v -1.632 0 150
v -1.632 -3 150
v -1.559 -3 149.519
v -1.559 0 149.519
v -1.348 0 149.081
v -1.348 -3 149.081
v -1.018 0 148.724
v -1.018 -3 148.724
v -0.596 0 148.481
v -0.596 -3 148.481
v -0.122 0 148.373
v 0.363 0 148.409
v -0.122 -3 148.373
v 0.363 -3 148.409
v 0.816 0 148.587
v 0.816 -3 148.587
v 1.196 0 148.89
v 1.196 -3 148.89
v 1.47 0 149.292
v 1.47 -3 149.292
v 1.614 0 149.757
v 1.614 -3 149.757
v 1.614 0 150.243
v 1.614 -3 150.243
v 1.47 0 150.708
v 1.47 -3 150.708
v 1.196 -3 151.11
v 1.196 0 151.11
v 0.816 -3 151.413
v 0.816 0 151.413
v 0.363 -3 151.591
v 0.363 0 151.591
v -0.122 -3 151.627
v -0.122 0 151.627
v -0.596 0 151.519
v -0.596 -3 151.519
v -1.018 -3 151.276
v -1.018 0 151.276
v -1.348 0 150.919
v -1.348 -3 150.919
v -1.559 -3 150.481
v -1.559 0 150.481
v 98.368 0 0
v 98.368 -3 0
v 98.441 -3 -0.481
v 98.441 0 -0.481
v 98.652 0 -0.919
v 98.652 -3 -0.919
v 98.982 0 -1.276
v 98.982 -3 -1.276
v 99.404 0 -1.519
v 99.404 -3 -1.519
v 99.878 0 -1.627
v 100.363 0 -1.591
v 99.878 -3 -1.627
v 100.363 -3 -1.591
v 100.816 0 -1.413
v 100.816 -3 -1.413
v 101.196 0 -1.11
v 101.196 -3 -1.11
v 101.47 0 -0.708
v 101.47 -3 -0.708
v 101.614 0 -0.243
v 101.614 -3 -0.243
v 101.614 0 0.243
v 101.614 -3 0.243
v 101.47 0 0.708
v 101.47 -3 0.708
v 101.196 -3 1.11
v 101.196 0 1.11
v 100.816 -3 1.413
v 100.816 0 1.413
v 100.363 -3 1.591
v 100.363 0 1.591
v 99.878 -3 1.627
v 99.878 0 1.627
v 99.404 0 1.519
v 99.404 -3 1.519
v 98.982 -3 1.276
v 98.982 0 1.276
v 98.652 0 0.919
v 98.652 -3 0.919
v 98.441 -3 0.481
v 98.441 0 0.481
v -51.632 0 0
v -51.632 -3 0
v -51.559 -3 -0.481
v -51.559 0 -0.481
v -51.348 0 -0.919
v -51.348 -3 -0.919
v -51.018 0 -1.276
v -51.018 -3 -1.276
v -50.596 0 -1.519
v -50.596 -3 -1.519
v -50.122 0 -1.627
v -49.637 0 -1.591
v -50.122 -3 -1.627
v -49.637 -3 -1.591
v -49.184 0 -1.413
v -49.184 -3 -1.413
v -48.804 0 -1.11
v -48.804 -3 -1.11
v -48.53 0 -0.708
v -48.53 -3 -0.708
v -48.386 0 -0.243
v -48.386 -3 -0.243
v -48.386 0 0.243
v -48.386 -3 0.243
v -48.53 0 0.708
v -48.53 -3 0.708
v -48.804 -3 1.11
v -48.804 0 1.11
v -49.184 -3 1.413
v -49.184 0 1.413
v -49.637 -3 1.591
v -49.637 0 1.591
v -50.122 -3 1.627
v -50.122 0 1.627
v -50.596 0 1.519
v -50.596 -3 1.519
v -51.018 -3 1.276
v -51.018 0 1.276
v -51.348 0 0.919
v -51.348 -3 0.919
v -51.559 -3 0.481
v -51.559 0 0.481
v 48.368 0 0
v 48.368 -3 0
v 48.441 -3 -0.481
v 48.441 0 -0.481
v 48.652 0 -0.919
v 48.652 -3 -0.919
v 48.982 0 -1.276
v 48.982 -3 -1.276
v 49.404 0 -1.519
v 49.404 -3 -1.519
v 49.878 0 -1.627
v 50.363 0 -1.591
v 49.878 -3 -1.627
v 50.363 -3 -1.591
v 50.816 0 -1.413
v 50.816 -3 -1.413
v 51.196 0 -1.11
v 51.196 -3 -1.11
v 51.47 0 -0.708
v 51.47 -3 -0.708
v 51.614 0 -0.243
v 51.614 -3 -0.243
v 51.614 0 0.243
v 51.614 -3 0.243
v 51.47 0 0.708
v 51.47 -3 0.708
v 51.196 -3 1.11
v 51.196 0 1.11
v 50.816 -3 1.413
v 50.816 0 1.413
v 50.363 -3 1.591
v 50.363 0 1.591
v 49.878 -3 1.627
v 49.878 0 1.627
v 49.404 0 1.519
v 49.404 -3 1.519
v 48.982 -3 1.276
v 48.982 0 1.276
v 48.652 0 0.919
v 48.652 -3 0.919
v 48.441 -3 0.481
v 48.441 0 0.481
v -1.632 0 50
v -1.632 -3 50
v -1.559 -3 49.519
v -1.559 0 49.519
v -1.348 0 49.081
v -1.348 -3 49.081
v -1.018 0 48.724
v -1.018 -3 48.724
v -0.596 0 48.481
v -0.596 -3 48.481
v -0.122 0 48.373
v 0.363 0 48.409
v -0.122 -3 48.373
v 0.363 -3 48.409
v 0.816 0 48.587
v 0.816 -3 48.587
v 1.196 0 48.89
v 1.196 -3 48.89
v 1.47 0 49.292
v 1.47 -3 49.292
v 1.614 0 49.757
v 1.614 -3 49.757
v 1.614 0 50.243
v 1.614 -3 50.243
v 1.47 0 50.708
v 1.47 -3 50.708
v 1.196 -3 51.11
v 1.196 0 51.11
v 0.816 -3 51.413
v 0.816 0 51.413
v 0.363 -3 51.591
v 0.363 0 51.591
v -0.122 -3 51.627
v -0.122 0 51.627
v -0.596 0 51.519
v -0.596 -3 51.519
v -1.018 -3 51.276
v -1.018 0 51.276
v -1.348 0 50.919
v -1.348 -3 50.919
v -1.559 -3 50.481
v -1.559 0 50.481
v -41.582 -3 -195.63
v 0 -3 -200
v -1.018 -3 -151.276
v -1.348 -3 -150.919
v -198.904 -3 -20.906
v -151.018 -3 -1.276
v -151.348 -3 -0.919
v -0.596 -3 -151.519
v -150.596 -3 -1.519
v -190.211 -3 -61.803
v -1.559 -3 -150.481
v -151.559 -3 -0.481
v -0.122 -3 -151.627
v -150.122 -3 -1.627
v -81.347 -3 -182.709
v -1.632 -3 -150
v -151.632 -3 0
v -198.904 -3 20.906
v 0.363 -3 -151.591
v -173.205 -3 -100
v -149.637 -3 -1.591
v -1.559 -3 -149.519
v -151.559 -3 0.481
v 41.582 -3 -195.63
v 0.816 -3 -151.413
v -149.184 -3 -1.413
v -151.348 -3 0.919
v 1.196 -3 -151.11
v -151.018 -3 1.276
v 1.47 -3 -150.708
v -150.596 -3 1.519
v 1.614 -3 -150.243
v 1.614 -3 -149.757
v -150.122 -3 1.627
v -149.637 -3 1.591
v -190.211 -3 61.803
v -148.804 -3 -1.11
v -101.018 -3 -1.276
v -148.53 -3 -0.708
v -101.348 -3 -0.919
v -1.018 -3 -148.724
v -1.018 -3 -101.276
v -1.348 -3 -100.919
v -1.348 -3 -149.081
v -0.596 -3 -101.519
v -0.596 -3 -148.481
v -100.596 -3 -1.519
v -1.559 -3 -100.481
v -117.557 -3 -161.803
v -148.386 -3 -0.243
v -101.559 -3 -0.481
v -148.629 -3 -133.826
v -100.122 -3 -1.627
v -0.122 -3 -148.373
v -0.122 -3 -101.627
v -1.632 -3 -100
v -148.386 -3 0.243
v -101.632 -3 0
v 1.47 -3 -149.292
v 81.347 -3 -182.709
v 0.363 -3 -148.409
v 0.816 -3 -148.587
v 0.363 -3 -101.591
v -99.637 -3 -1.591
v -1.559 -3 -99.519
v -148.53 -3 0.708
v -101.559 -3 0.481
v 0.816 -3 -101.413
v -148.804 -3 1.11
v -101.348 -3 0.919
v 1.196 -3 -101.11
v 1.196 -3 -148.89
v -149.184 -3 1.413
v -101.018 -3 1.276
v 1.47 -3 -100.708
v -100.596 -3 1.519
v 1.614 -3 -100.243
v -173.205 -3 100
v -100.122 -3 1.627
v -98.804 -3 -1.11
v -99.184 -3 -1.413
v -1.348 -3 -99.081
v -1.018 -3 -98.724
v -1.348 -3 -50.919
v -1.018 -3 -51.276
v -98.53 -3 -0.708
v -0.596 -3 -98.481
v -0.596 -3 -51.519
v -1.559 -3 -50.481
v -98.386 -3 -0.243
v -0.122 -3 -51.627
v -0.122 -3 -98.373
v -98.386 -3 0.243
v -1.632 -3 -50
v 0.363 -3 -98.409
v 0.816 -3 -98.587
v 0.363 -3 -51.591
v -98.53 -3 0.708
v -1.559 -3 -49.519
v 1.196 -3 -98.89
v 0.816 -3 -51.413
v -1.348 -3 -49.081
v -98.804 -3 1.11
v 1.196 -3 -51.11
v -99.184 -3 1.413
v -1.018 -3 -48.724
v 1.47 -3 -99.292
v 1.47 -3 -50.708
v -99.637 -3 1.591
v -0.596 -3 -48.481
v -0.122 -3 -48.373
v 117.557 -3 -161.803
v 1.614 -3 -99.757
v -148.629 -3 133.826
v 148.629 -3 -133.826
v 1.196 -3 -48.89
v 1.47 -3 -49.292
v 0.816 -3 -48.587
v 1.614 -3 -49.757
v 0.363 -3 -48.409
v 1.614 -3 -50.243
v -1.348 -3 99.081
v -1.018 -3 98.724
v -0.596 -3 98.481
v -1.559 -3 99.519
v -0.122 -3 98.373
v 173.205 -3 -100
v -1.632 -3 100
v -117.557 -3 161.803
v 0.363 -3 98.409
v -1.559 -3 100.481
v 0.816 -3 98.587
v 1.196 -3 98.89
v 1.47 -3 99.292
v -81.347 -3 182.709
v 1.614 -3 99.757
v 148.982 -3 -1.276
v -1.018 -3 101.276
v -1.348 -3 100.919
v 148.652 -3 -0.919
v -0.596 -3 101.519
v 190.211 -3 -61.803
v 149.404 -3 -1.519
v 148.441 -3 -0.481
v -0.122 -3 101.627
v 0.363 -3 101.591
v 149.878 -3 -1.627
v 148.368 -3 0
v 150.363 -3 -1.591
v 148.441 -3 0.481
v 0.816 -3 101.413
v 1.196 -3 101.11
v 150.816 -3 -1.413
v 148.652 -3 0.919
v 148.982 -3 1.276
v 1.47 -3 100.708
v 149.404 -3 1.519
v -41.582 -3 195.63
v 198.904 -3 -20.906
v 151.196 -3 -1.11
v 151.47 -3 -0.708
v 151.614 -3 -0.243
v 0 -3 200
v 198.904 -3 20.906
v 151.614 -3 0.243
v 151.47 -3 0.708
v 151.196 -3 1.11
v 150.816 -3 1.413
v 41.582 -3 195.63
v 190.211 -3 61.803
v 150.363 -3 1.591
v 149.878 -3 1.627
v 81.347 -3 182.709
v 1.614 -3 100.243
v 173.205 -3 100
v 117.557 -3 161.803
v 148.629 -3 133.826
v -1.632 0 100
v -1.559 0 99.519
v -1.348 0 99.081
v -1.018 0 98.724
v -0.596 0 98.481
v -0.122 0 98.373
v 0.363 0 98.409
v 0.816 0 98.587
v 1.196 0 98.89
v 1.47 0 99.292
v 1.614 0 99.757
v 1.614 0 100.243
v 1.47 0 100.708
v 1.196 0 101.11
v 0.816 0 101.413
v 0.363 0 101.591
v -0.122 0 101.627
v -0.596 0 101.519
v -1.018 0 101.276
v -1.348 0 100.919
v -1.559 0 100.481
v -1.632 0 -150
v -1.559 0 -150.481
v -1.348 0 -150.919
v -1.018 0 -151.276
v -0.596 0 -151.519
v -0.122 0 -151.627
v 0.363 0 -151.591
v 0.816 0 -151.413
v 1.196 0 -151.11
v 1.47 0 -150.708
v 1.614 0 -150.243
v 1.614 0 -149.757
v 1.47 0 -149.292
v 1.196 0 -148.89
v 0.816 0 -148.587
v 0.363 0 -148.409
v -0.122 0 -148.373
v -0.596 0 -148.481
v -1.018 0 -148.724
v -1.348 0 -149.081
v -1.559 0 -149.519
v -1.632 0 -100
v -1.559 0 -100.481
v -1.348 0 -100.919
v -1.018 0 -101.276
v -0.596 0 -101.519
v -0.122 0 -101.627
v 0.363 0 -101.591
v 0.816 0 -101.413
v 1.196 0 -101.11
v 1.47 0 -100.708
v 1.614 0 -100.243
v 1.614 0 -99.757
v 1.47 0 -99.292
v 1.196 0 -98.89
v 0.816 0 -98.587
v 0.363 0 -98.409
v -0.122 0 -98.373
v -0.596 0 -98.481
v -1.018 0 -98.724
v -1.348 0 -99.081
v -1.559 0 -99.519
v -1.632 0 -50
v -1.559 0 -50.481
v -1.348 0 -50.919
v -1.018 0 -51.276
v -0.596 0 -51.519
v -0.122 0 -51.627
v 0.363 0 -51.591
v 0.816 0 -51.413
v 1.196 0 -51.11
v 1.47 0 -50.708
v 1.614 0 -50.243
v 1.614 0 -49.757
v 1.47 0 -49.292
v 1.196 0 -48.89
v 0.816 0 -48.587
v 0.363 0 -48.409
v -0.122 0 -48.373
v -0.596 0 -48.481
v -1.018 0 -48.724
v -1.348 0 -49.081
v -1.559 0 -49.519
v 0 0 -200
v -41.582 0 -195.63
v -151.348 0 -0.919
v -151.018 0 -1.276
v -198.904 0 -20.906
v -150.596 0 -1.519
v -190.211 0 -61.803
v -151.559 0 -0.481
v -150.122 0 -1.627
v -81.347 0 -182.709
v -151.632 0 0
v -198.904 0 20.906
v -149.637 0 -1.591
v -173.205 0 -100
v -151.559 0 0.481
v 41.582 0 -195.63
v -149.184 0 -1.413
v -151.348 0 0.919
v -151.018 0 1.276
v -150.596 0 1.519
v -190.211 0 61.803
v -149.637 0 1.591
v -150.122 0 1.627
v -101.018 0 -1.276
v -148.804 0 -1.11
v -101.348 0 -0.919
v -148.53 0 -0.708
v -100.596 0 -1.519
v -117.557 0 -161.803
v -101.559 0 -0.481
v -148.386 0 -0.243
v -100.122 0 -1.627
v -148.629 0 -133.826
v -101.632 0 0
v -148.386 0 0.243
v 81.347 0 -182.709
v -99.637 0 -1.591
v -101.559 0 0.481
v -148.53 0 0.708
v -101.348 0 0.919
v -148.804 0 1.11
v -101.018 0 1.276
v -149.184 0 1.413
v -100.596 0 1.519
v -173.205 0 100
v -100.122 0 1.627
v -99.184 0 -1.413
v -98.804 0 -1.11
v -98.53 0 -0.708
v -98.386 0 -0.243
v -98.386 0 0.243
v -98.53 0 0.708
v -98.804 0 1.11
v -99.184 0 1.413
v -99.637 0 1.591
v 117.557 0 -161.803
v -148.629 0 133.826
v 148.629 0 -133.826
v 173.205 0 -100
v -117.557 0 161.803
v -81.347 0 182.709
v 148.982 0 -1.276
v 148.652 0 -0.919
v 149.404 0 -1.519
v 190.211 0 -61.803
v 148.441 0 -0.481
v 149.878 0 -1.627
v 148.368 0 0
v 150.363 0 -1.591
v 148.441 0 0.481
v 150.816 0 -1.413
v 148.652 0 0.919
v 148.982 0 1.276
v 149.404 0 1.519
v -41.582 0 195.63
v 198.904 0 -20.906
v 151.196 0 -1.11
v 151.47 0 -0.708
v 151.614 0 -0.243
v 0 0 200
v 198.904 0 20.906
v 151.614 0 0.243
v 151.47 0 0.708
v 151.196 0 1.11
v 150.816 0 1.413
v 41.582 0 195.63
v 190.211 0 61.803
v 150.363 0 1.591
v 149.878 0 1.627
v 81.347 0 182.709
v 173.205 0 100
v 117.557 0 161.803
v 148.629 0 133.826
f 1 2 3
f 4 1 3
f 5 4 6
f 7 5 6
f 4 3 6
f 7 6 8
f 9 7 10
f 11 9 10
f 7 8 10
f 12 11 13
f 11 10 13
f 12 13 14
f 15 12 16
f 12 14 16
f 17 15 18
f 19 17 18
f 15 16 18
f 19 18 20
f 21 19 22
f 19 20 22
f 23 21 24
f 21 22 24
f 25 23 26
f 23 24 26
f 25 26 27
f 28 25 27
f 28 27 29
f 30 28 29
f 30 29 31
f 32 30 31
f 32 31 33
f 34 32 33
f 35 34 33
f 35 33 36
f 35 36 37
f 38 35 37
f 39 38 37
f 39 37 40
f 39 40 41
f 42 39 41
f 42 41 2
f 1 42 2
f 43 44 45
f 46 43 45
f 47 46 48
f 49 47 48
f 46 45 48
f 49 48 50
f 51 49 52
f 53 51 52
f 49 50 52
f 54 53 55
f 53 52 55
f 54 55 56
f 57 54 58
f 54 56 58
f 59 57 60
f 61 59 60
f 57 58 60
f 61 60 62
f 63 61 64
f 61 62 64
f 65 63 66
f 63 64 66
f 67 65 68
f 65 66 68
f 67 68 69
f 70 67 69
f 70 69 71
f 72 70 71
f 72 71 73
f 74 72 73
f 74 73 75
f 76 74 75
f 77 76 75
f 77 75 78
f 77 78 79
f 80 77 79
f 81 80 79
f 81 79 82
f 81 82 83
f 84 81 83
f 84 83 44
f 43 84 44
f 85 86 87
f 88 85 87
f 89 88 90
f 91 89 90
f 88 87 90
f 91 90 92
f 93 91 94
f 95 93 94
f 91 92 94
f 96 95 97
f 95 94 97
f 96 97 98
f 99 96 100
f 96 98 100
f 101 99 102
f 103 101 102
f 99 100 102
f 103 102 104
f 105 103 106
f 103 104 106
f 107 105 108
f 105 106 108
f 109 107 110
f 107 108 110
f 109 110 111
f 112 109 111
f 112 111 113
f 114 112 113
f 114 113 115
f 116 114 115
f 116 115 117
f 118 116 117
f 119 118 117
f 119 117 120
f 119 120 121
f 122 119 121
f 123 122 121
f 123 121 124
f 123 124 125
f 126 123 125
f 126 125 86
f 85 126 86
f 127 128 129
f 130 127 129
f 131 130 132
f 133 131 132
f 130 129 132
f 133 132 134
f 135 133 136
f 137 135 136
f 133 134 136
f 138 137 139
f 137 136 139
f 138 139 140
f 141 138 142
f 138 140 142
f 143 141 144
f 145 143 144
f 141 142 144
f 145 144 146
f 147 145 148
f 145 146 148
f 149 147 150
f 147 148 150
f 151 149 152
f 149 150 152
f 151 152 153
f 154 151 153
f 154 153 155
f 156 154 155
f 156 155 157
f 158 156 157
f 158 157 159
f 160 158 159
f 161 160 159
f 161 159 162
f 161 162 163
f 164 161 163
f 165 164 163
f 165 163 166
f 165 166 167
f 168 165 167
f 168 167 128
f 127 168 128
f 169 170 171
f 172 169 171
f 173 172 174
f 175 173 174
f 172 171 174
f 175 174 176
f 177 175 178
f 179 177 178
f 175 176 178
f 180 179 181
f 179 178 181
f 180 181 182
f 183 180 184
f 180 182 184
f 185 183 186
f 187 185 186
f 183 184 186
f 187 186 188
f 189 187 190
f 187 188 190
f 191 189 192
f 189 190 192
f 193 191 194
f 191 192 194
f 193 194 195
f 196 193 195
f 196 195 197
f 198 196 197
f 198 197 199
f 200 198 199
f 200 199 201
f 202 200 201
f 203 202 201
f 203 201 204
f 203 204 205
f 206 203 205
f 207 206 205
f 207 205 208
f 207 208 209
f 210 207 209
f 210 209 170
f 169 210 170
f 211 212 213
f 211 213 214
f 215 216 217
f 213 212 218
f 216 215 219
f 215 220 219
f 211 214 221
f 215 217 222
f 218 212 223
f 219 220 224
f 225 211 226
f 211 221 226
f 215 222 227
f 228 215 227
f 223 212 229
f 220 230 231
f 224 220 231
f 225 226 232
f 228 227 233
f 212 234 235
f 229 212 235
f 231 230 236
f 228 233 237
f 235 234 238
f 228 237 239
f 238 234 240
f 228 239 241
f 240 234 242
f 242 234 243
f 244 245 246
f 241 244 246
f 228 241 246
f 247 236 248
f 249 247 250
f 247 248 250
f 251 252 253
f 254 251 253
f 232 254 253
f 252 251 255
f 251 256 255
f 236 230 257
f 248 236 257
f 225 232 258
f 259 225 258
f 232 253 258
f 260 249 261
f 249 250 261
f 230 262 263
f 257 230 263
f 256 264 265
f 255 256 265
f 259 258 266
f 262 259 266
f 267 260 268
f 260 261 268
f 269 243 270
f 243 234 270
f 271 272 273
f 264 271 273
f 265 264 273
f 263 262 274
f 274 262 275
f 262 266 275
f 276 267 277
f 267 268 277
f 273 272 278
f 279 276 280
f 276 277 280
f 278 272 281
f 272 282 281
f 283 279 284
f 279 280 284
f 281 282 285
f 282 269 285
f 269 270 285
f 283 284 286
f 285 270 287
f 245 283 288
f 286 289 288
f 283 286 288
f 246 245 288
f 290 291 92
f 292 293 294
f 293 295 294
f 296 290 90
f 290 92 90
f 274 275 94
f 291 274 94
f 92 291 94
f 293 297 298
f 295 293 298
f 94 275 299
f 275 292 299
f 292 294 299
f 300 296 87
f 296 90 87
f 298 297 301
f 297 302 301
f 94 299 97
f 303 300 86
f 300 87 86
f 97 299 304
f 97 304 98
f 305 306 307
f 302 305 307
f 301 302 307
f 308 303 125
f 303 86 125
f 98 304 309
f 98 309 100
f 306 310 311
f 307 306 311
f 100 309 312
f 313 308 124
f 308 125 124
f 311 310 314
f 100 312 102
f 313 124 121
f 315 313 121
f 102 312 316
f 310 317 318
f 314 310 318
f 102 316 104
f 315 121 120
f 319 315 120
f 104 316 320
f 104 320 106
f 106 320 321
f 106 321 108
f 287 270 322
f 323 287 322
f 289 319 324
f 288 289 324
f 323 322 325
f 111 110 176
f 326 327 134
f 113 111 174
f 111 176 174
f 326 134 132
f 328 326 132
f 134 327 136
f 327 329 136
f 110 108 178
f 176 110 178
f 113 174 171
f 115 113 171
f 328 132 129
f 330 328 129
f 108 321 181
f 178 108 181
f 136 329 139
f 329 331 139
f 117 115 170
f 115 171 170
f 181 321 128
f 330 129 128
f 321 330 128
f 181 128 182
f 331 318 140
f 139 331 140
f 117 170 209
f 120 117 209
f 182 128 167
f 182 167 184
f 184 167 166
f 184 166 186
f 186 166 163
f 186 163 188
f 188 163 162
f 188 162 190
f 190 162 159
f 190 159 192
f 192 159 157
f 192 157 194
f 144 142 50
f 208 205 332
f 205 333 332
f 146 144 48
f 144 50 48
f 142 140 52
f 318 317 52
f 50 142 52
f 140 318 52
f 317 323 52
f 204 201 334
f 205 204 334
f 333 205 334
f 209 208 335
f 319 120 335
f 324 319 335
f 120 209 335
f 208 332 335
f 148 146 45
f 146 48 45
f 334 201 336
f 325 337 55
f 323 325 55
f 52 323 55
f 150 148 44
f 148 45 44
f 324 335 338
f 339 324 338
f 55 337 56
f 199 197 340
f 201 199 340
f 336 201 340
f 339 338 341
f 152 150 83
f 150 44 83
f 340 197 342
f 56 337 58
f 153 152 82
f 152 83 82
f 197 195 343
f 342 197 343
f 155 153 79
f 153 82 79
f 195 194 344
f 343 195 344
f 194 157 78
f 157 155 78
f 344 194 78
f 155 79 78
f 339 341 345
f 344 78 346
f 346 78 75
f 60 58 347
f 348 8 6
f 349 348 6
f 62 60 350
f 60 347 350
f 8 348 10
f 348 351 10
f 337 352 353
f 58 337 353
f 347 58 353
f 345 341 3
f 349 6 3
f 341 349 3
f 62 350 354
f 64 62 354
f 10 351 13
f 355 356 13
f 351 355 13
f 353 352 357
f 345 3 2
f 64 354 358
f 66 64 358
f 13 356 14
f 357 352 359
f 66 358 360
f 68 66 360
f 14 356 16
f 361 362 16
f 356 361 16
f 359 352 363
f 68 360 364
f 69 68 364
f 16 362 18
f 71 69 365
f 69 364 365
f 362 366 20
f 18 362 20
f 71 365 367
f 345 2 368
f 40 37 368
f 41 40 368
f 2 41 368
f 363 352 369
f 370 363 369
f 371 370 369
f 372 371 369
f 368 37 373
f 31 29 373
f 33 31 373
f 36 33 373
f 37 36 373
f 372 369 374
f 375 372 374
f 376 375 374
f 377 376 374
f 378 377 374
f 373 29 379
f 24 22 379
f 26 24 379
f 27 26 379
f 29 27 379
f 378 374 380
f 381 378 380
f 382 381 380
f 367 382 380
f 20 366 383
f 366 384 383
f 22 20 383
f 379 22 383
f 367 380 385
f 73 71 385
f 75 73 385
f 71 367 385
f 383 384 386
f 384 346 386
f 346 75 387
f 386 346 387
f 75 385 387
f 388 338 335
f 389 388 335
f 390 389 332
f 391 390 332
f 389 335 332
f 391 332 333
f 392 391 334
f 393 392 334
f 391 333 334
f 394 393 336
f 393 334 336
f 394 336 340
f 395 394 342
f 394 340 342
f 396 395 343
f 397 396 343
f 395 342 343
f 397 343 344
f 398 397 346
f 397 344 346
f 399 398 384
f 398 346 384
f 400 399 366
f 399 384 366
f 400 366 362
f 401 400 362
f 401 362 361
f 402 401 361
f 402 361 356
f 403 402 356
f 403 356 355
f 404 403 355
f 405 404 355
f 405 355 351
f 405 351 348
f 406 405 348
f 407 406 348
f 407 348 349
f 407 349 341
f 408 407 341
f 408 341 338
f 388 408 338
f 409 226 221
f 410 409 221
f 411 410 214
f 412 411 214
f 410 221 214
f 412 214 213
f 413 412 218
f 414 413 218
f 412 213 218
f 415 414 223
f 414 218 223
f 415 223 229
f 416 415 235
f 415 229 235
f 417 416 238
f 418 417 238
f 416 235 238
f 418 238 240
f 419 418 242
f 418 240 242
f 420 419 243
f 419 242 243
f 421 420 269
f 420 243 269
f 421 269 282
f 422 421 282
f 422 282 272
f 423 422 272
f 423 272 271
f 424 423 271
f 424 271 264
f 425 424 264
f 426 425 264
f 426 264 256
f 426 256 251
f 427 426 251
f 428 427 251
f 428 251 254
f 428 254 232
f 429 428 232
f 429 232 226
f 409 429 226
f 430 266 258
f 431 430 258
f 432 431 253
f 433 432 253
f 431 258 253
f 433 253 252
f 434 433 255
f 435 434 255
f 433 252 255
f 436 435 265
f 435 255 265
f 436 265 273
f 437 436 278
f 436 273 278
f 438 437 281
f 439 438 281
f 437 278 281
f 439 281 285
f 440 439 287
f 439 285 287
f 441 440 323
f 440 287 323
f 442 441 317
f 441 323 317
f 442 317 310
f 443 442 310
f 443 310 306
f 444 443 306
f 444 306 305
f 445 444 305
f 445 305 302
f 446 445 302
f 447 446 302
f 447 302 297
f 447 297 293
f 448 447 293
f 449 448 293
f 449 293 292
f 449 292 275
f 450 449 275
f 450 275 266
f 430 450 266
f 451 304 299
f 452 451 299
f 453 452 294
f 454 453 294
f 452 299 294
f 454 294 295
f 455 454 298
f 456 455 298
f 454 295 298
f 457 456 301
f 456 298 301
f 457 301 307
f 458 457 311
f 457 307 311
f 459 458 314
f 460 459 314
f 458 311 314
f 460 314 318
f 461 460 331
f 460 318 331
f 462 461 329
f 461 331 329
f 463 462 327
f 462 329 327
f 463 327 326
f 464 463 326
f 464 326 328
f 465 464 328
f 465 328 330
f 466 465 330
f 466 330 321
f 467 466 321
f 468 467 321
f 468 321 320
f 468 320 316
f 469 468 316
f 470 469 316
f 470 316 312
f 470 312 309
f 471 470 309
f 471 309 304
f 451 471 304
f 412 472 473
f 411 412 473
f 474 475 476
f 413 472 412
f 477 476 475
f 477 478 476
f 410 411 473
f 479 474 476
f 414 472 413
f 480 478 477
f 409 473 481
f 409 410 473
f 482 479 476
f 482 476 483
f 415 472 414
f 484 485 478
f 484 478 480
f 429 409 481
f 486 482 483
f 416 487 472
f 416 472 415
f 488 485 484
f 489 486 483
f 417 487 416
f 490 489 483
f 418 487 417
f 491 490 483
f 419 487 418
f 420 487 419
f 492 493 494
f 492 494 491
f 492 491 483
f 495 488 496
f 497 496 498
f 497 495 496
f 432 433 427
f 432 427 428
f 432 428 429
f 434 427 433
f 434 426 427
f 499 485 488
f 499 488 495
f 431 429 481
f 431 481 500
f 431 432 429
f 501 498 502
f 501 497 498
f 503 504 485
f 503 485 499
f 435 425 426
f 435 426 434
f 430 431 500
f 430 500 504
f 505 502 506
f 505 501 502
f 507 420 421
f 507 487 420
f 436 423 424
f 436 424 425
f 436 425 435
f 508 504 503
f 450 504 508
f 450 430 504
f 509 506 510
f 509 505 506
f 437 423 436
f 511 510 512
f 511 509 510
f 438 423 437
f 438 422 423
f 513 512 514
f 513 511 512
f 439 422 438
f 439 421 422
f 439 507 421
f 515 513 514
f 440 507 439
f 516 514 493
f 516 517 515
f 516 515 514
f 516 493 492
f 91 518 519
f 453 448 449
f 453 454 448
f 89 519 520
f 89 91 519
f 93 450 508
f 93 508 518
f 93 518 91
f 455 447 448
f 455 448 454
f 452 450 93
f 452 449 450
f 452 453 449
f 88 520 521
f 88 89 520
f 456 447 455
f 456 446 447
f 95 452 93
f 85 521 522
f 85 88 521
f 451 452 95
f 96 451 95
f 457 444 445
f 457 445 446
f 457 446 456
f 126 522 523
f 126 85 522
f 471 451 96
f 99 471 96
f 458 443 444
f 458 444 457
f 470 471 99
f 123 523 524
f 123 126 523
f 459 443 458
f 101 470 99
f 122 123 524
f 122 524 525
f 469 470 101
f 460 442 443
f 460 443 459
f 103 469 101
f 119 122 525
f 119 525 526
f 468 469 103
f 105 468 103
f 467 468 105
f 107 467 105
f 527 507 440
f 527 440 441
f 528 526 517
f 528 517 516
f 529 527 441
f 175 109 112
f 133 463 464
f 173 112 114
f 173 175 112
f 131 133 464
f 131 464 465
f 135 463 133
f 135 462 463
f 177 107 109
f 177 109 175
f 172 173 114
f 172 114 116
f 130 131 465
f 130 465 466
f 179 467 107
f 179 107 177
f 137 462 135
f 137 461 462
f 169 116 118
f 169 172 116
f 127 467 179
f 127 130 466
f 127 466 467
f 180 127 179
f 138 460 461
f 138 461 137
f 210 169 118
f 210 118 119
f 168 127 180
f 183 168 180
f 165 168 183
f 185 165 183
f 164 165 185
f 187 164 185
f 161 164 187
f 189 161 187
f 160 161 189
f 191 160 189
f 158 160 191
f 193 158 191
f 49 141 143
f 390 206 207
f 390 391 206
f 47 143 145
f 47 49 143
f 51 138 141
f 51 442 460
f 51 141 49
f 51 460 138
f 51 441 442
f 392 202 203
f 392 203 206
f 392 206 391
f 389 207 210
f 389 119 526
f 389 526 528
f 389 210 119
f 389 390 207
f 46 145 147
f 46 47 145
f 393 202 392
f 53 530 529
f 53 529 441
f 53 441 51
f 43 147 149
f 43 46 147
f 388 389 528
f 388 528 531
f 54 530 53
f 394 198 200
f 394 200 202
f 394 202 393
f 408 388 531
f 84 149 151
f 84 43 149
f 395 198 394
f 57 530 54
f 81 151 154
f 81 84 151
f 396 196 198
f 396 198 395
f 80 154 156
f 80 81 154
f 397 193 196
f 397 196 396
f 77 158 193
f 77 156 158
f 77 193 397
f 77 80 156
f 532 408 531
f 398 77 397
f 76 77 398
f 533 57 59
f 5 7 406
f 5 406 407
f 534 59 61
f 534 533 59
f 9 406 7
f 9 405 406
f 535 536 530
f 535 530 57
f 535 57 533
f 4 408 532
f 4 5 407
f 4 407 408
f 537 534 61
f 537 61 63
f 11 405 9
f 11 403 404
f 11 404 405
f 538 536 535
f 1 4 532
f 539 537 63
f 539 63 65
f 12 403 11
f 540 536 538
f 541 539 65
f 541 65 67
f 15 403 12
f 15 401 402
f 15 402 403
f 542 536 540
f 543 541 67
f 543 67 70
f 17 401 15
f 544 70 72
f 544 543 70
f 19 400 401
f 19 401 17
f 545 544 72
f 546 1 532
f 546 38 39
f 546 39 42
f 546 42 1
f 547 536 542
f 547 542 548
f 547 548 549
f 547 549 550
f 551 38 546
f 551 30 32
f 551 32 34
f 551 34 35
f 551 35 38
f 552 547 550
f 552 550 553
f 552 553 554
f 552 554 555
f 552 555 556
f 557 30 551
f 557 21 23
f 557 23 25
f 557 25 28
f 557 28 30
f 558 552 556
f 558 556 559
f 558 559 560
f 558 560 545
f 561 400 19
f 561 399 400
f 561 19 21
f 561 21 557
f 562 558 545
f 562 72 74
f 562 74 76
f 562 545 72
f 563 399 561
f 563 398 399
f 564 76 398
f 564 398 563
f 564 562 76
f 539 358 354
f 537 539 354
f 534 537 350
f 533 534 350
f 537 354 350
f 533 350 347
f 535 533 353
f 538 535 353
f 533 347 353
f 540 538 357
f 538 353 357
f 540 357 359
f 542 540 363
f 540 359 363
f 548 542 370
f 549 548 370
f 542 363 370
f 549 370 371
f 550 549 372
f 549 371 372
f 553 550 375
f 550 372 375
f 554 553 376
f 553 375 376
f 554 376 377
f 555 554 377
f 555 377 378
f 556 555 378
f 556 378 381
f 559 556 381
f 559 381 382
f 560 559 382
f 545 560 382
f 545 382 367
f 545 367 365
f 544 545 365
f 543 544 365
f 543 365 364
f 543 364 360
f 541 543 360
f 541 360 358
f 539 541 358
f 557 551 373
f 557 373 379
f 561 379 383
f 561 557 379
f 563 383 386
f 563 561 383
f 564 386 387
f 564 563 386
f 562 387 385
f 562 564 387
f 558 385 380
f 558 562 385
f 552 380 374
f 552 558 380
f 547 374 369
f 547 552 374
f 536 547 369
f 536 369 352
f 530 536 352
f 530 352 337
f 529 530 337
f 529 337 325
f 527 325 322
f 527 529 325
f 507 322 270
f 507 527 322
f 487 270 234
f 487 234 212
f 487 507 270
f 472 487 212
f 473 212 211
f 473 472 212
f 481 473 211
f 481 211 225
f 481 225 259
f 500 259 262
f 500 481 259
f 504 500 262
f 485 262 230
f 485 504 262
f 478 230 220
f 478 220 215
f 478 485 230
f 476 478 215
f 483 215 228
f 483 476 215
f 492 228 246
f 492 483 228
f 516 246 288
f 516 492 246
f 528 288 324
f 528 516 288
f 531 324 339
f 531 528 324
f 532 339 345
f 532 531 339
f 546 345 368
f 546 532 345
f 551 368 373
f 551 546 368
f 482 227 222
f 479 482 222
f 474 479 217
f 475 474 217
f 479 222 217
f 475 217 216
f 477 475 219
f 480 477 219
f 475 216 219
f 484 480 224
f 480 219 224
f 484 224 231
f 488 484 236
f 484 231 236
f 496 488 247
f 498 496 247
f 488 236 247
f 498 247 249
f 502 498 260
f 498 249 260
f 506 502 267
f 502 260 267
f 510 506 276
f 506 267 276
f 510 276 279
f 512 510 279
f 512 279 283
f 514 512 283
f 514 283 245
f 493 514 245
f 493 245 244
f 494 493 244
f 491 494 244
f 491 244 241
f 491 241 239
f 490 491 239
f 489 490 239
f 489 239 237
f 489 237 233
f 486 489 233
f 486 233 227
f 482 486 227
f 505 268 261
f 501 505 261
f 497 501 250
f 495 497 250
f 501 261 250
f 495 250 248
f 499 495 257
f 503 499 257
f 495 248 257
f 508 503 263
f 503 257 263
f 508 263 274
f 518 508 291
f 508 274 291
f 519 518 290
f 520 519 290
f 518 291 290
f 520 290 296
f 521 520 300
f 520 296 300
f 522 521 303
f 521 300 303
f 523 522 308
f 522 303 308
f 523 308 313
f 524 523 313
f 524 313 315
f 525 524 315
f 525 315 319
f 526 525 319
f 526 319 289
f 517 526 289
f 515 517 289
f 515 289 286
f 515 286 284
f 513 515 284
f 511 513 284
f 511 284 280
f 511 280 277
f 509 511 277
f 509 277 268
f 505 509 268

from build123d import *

# Parameters (mm, degrees)
SKETCH3_R                    = 200
BASE_FLANGE1_DEPTH           = 3
F_30_0_1285_DIAMETER_HOLE1_D = 3.2639


# Sheet-metal steps are written as plain solids
with BuildPart() as part:
    # Sketch3 → Base-Flange1 (new body)
    with BuildSketch(Plane(origin=(0, 0, 0), x_dir=(1, 0, 0), z_dir=(0, 1, 0))):
        with Locations(Location((0, 0, 0), (0, 0, 270))):
            Circle(SKETCH3_R)
    extrude(amount=-BASE_FLANGE1_DEPTH)

    # #30 (0.1285) Diameter Hole1 (through all)
    with Locations(Plane(origin=(0, 0, 0), x_dir=(1, 0, 0), z_dir=(0, 1, 0))):
        with Locations((0, 150), (0, 100), (0, 50), (50, 0), (100, 0), (150, 0), (0, -50), (0, -100), (0, -150), (-50, 0), (-100, 0), (-150, 0)):
            Hole(F_30_0_1285_DIAMETER_HOLE1_D / 2)


solid = part.part
